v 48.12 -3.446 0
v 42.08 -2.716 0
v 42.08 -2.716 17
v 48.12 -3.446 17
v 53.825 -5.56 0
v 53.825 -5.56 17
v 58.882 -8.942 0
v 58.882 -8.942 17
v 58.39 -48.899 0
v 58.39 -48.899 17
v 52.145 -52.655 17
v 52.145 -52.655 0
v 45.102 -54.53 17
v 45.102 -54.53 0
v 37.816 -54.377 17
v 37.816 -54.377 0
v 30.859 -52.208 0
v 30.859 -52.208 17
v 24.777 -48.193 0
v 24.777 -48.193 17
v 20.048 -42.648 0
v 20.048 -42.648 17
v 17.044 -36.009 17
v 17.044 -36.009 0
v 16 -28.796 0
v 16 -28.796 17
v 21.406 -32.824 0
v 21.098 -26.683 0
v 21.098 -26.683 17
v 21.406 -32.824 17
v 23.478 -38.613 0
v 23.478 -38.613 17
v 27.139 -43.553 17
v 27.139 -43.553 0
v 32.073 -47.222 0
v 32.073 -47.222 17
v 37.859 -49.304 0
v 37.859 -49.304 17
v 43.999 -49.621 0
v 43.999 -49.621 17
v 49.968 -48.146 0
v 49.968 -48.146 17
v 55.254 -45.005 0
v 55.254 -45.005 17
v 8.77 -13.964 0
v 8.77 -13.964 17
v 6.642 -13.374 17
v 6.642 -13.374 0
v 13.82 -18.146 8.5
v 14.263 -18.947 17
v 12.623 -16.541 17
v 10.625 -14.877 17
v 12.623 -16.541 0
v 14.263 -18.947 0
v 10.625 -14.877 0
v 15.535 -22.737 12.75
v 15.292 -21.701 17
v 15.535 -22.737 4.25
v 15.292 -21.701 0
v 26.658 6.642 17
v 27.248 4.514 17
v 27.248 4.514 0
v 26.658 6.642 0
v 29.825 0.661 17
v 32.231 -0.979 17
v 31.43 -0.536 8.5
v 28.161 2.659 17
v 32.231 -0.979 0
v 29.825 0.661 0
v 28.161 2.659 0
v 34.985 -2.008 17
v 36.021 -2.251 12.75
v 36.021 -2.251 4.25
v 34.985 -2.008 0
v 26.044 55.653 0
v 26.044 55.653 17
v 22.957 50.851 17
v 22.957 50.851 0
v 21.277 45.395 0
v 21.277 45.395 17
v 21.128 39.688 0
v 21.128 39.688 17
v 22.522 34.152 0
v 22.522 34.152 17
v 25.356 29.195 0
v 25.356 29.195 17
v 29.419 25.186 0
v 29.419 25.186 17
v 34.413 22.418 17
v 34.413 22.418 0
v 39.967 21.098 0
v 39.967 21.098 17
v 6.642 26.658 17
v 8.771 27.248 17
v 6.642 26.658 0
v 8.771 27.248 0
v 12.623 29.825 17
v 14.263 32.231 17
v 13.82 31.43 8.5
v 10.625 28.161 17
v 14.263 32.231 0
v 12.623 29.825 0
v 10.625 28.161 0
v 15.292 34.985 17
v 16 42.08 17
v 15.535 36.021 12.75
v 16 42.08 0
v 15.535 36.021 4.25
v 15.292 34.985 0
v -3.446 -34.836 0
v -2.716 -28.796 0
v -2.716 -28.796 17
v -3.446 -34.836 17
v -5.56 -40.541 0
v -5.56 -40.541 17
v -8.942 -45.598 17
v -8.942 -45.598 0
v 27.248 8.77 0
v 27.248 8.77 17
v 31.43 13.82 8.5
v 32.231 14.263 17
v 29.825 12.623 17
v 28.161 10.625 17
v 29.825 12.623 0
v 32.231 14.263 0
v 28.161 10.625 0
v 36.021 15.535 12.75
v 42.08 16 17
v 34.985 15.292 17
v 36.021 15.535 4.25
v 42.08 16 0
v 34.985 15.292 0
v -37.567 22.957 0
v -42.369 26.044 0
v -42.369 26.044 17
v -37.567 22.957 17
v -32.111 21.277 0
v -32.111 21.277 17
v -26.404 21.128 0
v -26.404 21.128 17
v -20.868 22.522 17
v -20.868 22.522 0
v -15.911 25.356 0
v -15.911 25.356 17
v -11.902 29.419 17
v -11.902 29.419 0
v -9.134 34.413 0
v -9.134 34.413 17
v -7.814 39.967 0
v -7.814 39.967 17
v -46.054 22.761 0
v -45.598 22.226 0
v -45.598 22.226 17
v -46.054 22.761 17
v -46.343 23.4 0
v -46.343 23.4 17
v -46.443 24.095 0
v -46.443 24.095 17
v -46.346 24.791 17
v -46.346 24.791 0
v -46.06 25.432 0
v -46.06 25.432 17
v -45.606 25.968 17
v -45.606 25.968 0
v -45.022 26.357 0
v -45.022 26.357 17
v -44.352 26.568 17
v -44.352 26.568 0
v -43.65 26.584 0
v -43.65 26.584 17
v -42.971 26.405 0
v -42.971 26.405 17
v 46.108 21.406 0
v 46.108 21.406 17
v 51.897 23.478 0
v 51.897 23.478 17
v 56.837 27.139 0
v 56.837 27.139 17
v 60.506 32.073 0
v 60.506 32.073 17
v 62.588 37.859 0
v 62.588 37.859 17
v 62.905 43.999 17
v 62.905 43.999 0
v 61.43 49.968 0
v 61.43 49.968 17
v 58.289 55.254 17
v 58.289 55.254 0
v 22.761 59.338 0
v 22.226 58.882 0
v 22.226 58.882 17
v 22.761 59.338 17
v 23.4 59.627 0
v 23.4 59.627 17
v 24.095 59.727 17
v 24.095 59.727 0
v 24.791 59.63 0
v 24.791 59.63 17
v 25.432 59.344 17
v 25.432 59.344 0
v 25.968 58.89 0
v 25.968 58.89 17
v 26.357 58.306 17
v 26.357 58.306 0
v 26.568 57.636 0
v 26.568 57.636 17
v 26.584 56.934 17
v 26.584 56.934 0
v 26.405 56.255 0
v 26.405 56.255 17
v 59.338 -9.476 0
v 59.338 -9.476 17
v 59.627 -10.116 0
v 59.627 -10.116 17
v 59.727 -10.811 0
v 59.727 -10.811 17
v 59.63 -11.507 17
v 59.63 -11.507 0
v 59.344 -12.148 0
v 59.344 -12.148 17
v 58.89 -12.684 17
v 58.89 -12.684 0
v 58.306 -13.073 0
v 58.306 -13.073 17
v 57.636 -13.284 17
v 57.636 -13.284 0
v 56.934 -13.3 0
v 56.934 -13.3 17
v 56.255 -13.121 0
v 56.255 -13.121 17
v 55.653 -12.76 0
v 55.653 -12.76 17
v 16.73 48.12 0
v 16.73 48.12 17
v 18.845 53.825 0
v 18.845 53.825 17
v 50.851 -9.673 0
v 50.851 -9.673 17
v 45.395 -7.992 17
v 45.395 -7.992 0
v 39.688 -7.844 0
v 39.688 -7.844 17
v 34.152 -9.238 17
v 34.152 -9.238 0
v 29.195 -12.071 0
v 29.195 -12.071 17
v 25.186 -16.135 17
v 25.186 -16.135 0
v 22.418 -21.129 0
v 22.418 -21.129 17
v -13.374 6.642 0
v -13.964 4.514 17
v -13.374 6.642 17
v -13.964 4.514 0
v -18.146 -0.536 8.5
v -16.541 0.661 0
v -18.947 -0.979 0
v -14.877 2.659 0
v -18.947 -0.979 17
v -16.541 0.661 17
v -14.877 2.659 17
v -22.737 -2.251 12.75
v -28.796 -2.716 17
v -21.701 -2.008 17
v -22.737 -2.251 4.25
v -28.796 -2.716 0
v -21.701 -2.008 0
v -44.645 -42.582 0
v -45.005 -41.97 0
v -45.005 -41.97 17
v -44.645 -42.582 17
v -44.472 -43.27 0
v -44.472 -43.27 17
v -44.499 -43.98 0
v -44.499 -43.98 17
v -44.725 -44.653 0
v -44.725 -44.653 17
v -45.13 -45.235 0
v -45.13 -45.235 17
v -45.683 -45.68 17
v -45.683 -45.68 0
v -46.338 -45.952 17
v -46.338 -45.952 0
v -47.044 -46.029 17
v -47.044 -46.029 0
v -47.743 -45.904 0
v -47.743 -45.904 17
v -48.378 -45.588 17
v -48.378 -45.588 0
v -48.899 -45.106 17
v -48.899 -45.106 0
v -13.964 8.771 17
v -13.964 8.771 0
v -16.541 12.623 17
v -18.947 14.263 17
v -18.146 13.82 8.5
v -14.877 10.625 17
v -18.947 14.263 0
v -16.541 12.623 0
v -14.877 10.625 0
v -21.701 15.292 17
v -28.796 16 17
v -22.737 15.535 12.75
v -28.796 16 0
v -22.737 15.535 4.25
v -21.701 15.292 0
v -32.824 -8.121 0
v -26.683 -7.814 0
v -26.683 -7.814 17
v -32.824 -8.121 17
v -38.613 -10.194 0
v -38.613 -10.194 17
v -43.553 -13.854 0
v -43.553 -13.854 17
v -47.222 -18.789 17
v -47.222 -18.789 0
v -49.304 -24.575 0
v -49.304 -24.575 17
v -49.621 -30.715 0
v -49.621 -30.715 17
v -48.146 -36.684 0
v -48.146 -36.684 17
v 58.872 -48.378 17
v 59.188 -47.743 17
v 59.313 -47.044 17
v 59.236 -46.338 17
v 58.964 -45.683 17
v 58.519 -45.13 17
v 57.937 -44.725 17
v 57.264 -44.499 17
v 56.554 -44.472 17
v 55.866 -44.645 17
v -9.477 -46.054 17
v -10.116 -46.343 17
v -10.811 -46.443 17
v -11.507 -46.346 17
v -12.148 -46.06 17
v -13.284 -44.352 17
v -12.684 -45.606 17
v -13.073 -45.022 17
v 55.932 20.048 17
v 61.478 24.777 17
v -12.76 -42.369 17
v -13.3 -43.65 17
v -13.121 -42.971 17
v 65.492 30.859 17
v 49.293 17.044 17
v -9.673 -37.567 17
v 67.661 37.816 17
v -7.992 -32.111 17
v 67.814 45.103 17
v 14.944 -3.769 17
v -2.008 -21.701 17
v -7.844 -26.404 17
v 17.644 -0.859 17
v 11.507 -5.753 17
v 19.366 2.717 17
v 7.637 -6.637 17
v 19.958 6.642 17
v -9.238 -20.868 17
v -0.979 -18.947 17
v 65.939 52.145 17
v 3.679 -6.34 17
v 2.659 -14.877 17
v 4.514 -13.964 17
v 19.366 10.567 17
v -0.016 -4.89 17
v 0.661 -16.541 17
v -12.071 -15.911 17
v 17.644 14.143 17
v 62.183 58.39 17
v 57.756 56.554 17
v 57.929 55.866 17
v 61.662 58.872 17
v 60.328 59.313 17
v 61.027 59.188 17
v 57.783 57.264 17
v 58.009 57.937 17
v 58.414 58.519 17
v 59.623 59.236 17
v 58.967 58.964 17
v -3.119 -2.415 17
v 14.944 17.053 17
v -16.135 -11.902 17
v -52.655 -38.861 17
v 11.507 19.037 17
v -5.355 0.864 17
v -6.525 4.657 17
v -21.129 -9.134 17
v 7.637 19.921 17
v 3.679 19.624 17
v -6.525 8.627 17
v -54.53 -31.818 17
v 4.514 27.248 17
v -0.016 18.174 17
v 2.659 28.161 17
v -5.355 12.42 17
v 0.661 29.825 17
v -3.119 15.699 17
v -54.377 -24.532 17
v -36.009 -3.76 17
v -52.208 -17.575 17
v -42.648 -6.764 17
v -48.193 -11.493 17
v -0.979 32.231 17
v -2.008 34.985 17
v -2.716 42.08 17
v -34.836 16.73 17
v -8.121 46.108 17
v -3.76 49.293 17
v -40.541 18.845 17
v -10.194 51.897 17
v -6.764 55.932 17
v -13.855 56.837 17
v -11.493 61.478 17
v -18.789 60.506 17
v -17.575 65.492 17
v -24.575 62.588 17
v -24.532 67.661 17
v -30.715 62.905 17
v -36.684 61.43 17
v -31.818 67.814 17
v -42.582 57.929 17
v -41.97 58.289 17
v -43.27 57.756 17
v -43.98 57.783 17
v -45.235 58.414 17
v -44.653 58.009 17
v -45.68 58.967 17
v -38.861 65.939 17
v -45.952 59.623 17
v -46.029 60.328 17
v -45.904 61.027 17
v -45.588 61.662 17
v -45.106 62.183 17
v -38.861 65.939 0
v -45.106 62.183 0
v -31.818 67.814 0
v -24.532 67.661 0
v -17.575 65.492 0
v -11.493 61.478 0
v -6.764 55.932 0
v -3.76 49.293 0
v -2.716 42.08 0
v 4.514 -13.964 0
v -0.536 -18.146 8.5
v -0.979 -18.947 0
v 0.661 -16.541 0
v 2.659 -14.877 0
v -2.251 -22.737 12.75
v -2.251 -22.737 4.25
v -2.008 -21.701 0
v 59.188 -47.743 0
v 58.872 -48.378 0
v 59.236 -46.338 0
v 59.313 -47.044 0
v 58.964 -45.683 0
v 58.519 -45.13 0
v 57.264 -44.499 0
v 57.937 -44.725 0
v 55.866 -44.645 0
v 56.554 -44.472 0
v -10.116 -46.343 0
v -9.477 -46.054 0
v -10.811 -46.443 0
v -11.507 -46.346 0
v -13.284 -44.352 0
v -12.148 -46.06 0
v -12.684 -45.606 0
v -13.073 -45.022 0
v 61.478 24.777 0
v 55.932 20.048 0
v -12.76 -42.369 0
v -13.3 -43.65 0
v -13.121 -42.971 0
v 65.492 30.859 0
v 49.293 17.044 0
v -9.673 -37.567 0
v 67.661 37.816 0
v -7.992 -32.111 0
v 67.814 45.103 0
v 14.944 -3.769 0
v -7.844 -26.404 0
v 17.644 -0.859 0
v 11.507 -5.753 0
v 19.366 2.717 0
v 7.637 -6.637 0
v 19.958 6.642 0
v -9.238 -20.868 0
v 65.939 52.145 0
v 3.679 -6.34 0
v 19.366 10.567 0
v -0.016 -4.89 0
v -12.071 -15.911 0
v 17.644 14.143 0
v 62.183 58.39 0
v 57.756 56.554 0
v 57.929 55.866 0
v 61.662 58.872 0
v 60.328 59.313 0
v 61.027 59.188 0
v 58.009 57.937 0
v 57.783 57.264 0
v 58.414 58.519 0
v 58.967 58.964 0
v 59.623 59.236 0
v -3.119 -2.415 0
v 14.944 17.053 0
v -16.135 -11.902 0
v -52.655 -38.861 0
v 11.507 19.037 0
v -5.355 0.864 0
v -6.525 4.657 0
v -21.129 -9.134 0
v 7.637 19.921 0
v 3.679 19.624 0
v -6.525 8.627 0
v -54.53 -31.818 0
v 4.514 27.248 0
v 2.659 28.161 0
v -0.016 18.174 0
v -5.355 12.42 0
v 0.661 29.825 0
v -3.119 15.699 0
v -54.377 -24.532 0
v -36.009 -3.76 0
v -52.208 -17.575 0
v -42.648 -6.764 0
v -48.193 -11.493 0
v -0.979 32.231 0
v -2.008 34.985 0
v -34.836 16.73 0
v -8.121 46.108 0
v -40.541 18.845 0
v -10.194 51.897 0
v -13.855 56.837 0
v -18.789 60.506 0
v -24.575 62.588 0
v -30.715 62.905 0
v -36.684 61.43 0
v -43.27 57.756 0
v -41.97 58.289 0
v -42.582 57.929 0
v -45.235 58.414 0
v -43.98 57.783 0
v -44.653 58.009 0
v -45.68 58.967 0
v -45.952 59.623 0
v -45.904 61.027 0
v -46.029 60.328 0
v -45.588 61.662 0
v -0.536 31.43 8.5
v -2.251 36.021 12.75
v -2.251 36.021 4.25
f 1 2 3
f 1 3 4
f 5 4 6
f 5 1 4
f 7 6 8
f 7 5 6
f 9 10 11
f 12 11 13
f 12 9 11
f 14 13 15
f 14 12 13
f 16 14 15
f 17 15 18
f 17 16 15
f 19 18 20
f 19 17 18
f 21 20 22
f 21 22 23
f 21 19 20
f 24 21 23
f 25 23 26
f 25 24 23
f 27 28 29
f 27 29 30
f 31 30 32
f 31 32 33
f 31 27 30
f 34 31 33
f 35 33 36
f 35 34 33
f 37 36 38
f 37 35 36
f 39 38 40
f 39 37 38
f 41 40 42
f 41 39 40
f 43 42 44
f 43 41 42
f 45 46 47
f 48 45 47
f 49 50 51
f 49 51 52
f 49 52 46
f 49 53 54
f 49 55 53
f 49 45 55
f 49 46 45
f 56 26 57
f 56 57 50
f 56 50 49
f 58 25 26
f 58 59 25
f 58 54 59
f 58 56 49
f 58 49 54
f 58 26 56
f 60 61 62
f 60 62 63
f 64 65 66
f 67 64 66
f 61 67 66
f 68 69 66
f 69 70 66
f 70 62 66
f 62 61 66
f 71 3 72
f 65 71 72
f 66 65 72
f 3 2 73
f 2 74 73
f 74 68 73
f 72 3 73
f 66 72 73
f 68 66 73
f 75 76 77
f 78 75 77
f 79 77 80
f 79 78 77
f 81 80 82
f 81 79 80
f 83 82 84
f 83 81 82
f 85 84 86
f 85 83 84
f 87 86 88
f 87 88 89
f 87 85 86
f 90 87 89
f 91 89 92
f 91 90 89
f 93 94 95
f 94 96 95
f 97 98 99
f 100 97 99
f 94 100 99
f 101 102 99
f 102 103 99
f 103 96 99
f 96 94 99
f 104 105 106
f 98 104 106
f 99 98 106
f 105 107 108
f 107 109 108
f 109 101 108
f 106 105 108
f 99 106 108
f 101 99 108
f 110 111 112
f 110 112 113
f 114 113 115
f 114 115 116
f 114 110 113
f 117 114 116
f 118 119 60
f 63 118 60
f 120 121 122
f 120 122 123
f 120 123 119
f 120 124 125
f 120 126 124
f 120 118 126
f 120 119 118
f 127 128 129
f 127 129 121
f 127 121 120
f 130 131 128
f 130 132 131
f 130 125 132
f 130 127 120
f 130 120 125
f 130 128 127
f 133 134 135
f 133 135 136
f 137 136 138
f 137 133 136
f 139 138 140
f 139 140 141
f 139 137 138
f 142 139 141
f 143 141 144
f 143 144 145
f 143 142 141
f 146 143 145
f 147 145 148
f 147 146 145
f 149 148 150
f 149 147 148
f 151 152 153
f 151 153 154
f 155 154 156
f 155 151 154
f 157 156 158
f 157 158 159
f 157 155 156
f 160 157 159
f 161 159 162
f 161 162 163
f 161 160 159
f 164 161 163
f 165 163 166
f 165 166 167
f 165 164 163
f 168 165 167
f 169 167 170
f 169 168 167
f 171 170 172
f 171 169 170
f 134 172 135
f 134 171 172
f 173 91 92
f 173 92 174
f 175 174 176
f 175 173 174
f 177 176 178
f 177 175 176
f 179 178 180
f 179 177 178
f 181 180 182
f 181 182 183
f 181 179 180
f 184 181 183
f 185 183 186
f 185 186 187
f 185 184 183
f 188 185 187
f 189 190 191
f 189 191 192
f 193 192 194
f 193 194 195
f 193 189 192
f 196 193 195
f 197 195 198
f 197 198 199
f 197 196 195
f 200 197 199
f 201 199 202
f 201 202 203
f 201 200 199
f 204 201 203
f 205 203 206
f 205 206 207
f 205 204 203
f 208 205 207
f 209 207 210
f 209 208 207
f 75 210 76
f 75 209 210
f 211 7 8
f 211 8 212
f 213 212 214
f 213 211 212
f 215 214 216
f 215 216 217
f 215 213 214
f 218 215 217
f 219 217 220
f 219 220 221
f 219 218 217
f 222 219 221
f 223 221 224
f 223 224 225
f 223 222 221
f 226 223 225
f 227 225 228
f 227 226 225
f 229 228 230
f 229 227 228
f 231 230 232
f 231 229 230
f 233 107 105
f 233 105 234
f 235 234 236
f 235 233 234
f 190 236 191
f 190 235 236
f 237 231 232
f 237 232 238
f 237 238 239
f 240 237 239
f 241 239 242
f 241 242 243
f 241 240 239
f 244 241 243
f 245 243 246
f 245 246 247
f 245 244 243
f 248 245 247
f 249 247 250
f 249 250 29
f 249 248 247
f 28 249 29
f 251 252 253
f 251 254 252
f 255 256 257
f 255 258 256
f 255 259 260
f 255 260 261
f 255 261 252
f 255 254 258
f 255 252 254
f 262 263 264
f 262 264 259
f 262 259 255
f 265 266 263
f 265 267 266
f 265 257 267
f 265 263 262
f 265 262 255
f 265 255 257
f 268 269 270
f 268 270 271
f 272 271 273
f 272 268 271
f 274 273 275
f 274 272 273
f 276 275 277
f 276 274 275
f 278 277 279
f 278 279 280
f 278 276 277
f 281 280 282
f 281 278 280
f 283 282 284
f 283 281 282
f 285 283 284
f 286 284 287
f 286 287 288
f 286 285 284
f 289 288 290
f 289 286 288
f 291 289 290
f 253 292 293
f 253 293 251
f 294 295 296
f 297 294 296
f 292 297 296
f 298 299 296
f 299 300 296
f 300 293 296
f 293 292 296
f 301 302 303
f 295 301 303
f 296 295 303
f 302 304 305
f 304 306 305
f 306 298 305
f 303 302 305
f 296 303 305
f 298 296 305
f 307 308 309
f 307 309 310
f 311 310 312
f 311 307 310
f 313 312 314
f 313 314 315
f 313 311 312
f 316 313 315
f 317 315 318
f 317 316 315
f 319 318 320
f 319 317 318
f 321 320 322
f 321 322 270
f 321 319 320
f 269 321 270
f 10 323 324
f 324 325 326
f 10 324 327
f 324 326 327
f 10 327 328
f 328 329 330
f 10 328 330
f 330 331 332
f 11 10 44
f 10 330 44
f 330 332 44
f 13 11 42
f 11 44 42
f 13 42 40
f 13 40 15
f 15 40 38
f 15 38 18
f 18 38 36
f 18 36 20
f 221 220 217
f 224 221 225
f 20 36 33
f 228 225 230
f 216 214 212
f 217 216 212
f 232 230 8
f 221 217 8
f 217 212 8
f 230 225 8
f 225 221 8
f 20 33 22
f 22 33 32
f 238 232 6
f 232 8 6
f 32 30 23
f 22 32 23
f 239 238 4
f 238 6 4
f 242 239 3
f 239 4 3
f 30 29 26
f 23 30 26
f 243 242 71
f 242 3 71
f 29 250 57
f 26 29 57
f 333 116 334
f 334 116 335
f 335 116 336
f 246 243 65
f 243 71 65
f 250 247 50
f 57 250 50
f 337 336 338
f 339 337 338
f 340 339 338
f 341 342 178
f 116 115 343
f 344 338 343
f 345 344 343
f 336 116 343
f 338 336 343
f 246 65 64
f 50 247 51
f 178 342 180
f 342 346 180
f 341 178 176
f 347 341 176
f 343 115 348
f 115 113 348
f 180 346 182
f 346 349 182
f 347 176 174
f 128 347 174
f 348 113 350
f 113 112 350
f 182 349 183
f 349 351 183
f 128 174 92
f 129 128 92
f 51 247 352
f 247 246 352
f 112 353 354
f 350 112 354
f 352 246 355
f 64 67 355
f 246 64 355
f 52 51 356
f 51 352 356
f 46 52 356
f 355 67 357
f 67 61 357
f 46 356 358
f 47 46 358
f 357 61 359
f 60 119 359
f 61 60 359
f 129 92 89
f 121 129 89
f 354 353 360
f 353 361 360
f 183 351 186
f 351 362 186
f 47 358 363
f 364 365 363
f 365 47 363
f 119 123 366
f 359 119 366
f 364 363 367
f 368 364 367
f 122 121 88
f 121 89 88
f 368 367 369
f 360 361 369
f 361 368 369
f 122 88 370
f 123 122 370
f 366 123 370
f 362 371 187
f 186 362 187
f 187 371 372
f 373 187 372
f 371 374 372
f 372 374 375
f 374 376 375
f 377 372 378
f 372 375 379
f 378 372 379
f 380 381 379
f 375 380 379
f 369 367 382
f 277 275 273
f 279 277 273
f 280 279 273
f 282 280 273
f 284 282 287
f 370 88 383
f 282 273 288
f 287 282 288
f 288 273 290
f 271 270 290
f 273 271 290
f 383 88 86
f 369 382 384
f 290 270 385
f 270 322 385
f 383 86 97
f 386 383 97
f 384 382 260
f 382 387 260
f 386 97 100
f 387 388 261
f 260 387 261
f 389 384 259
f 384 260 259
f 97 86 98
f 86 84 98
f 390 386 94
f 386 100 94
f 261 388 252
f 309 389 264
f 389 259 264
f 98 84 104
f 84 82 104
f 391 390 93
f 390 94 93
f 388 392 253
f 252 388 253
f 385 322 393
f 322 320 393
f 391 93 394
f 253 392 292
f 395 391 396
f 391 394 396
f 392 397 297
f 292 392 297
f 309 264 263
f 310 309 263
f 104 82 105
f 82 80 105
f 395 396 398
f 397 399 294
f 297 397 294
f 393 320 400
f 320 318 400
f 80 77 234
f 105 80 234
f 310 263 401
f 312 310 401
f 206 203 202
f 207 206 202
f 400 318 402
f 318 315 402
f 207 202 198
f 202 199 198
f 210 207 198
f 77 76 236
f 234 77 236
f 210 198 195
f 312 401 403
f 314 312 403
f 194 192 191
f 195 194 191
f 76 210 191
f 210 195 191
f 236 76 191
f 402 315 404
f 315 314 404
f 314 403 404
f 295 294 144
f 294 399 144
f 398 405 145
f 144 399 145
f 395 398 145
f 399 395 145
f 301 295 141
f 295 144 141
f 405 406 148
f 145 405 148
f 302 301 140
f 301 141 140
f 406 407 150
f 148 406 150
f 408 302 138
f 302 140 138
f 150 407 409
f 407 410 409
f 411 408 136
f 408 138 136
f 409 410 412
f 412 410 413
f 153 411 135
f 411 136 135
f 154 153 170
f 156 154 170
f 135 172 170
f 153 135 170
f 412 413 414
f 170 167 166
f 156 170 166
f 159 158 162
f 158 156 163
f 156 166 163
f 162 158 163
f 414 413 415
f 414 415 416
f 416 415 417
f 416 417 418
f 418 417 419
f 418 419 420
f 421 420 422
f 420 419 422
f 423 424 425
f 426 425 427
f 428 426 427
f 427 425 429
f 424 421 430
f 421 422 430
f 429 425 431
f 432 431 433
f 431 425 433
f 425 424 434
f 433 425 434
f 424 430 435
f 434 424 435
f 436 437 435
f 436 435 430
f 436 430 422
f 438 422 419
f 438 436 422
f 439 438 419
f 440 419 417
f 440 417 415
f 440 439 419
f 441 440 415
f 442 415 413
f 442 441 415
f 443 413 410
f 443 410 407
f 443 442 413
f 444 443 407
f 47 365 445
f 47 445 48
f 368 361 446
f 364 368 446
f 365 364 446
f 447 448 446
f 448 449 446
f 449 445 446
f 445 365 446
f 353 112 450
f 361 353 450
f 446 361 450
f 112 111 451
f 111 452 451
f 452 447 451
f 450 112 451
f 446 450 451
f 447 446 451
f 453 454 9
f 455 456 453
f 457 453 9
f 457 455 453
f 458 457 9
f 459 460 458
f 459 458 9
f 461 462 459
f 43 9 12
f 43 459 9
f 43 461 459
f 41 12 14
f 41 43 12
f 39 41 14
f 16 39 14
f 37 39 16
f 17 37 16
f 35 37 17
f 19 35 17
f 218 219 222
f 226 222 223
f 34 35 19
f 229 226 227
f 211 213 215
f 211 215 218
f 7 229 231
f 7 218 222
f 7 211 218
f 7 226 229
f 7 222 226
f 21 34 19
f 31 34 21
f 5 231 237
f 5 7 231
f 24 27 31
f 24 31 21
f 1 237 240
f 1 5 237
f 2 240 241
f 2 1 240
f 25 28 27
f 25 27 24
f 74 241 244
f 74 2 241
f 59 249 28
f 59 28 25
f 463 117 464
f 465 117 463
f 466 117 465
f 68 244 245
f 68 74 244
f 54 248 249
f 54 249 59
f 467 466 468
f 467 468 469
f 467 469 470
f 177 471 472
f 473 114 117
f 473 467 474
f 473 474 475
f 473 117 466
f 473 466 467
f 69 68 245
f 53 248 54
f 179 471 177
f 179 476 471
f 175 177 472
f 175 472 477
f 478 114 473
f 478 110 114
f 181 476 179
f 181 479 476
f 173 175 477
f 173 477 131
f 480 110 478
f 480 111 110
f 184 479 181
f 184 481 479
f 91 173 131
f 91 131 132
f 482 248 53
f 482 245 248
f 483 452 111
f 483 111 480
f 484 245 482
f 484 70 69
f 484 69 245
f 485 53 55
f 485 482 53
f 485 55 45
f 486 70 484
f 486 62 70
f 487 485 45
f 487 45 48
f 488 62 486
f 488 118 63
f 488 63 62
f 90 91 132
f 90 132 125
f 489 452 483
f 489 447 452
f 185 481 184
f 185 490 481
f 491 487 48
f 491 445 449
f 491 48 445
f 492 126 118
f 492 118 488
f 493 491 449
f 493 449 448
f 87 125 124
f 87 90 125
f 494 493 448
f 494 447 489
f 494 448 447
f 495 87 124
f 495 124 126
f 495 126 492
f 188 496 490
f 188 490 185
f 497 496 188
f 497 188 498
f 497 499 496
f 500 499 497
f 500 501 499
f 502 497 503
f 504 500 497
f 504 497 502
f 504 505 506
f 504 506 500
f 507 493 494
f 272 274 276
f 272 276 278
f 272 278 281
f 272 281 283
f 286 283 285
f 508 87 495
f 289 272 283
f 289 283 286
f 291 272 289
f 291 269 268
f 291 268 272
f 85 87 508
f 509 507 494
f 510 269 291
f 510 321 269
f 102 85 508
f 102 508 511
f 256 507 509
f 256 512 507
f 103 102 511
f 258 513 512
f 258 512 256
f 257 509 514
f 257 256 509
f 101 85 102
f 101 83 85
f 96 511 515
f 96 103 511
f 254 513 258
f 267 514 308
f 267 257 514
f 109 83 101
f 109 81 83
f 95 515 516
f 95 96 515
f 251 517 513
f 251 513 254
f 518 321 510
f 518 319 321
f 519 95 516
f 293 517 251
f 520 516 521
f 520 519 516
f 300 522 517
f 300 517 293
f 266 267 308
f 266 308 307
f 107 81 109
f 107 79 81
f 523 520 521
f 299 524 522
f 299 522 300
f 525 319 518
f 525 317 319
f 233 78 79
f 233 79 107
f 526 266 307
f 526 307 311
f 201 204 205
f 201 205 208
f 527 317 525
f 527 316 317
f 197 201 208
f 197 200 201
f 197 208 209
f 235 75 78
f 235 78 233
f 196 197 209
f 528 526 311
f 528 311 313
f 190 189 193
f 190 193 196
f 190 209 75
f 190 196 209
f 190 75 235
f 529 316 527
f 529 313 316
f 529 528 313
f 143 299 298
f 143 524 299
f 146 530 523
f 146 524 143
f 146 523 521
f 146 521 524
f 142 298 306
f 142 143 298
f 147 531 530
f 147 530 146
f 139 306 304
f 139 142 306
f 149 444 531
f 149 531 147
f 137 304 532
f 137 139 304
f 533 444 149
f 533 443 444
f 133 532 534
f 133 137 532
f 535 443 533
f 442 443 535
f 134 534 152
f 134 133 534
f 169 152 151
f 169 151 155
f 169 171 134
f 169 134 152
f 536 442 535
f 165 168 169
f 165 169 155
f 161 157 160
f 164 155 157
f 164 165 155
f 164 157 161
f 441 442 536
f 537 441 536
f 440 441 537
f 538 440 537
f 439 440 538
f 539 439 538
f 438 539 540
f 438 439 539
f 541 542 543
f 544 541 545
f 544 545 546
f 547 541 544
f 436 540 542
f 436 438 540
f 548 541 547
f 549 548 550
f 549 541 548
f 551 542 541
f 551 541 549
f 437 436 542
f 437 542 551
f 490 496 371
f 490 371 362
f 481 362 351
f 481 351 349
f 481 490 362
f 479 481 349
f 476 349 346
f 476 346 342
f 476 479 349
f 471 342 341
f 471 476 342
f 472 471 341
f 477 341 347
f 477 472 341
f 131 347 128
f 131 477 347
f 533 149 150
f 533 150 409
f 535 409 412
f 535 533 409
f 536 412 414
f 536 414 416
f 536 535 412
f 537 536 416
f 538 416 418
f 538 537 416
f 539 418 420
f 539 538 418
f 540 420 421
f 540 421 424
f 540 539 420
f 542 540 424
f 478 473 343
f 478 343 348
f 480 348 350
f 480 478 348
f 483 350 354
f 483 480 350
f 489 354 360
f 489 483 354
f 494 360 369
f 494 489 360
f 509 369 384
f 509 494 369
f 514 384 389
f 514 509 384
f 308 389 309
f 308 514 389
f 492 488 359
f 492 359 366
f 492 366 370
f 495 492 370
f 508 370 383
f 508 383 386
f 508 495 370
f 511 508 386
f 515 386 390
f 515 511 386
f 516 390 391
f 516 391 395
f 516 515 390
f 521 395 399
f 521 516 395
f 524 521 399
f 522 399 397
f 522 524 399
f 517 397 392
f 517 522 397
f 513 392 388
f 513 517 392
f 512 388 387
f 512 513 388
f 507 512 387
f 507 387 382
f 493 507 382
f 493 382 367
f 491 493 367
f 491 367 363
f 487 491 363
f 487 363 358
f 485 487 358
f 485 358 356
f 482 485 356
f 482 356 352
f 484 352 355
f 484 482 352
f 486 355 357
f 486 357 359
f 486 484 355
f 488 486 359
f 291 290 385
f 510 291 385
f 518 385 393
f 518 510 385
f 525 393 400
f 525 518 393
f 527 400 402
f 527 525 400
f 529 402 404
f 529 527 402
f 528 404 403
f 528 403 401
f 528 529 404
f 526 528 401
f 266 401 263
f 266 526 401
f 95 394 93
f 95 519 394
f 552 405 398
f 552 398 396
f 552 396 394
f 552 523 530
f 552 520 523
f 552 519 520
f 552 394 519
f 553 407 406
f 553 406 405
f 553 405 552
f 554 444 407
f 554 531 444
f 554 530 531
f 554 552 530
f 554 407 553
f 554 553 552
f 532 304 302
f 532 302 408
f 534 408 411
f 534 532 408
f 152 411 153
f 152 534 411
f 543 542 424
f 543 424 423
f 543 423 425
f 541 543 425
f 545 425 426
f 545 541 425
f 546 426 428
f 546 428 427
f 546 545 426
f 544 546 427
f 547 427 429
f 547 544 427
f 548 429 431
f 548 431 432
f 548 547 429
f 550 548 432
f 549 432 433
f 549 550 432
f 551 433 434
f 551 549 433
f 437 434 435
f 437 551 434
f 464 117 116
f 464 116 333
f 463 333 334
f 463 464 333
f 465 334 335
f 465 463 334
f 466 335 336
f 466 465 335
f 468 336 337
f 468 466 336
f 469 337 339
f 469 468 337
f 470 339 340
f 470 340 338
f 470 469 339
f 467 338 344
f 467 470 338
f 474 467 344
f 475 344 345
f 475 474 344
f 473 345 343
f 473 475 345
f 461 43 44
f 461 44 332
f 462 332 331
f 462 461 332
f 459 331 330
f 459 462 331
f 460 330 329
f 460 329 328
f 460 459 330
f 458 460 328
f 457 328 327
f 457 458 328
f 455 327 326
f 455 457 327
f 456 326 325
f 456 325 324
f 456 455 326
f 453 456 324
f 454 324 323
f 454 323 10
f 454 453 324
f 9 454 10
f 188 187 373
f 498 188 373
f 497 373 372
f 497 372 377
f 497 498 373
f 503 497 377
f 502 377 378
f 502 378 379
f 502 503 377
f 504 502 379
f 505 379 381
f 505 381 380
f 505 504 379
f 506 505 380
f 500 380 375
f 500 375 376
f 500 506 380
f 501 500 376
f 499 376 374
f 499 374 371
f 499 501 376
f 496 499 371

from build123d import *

# Parameters (mm, degrees)
ESQUISSE2_R        = 13.315895319
BOSS_EXTRU_1_DEPTH = 17


with BuildPart() as part:
    # Esquisse2 → Boss.-Extru.1 (new body)
    with BuildSketch(Plane.XY):
        with BuildLine():
            ThreePointArc((-41.970273906, 58.288916899), (-45.477336755, 58.674660716), (-45.106104784, 62.183289358))
            ThreePointArc((-45.106104784, 62.183289358), (-17.574909645, 65.492333679), (-2.716007813, 42.080167687))
            add(Edge.make_bspline(
                [(-2.716007813, 42.080167687), (-3.035124512, 28.491732954), (6.642053999, 26.657753906)],
                knots=[0, 0, 0, 1, 1, 1], degree=2))
            add(Edge.make_bspline(
                [(16, 42.080237959), (16.319218738, 28.491805623), (6.642053999, 26.657753906)],
                knots=[0, 0, 0, 1, 1, 1], degree=2))
            ThreePointArc((16, 42.080237959), (17.620066034, 51.034561919), (22.226418394, 58.882239885))
            ThreePointArc((22.226418394, 58.882239885), (25.715663474, 59.135975829), (26.044340034, 55.652990776))
            ThreePointArc((26.044340034, 55.652990776), (22.521938117, 34.151609621), (39.967073041, 21.098488371))
            ThreePointArc((39.967073041, 21.098488371), (60.505936251, 32.073055278), (58.288905312, 55.254314833))
            ThreePointArc((58.288905312, 55.254314833), (58.674649129, 58.761377683), (62.18327777, 58.390145711))
            ThreePointArc((62.18327777, 58.390145711), (65.492322092, 30.858950572), (42.080156099, 16.000048741))
            add(Edge.make_bspline(
                [(42.080156099, 16.000048741), (28.491721366, 16.319165439), (26.657742318, 6.641986928)],
                knots=[0, 0, 0, 1, 1, 1], degree=2))
            add(Edge.make_bspline(
                [(42.080226372, -2.715959073), (28.491794035, -3.035177811), (26.657742318, 6.641986928)],
                knots=[0, 0, 0, 1, 1, 1], degree=2))
            ThreePointArc((42.080226372, -2.715959073), (51.034550331, -4.336025106), (58.882228297, -8.942377467))
            ThreePointArc((58.882228297, -8.942377467), (59.135964241, -12.431622547), (55.652979189, -12.760299107))
            ThreePointArc((55.652979189, -12.760299107), (34.151598033, -9.23789719), (21.098476784, -26.683032113))
            ThreePointArc((21.098476784, -26.683032113), (32.07304369, -47.221895323), (55.254303246, -45.004864384))
            ThreePointArc((55.254303246, -45.004864384), (58.761366095, -45.390608201), (58.390134124, -48.899236843))
            ThreePointArc((58.390134124, -48.899236843), (30.858938985, -52.208281164), (16.000037153, -28.796115172))
            add(Edge.make_bspline(
                [(16.000037153, -28.796115172), (16.319153851, -15.207680439), (6.64197534, -13.373701391)],
                knots=[0, 0, 0, 1, 1, 1], degree=2))
            add(Edge.make_bspline(
                [(-2.71597066, -28.796185444), (-3.035189399, -15.207753108), (6.64197534, -13.373701391)],
                knots=[0, 0, 0, 1, 1, 1], degree=2))
            ThreePointArc((-2.71597066, -28.796185444), (-4.336036694, -37.750509404), (-8.942389054, -45.59818737))
            ThreePointArc((-8.942389054, -45.59818737), (-12.431634134, -45.851923314), (-12.760310694, -42.368938261))
            ThreePointArc((-12.760310694, -42.368938261), (-9.237908778, -20.867557106), (-26.683043701, -7.814435856))
            ThreePointArc((-26.683043701, -7.814435856), (-47.221906911, -18.789002763), (-45.004875972, -41.970262318))
            ThreePointArc((-45.004875972, -41.970262318), (-45.390619789, -45.477325168), (-48.899248431, -45.106093196))
            ThreePointArc((-48.899248431, -45.106093196), (-52.208292752, -17.574898057), (-28.79612676, -2.715996226))
            add(Edge.make_bspline(
                [(-28.79612676, -2.715996226), (-15.207692026, -3.035112924), (-13.373712979, 6.642065587)],
                knots=[0, 0, 0, 1, 1, 1], degree=2))
            add(Edge.make_bspline(
                [(-28.796197032, 16.000011588), (-15.207764695, 16.319230326), (-13.373712979, 6.642065587)],
                knots=[0, 0, 0, 1, 1, 1], degree=2))
            ThreePointArc((-28.796197032, 16.000011588), (-37.750520991, 17.620077621), (-45.598198957, 22.226429982))
            ThreePointArc((-45.598198957, 22.226429982), (-45.851934901, 25.715675062), (-42.368949849, 26.044351622))
            ThreePointArc((-42.368949849, 26.044351622), (-20.867568694, 22.521949705), (-7.814447444, 39.967084628))
            ThreePointArc((-7.814447444, 39.967084628), (-18.789014351, 60.505947838), (-41.970273906, 58.288916899))
        make_face()
        with Locations((6.64201467, 6.642026257)):
            Circle(ESQUISSE2_R, mode=Mode.SUBTRACT)
    extrude(amount=BOSS_EXTRU_1_DEPTH)


solid = part.part
